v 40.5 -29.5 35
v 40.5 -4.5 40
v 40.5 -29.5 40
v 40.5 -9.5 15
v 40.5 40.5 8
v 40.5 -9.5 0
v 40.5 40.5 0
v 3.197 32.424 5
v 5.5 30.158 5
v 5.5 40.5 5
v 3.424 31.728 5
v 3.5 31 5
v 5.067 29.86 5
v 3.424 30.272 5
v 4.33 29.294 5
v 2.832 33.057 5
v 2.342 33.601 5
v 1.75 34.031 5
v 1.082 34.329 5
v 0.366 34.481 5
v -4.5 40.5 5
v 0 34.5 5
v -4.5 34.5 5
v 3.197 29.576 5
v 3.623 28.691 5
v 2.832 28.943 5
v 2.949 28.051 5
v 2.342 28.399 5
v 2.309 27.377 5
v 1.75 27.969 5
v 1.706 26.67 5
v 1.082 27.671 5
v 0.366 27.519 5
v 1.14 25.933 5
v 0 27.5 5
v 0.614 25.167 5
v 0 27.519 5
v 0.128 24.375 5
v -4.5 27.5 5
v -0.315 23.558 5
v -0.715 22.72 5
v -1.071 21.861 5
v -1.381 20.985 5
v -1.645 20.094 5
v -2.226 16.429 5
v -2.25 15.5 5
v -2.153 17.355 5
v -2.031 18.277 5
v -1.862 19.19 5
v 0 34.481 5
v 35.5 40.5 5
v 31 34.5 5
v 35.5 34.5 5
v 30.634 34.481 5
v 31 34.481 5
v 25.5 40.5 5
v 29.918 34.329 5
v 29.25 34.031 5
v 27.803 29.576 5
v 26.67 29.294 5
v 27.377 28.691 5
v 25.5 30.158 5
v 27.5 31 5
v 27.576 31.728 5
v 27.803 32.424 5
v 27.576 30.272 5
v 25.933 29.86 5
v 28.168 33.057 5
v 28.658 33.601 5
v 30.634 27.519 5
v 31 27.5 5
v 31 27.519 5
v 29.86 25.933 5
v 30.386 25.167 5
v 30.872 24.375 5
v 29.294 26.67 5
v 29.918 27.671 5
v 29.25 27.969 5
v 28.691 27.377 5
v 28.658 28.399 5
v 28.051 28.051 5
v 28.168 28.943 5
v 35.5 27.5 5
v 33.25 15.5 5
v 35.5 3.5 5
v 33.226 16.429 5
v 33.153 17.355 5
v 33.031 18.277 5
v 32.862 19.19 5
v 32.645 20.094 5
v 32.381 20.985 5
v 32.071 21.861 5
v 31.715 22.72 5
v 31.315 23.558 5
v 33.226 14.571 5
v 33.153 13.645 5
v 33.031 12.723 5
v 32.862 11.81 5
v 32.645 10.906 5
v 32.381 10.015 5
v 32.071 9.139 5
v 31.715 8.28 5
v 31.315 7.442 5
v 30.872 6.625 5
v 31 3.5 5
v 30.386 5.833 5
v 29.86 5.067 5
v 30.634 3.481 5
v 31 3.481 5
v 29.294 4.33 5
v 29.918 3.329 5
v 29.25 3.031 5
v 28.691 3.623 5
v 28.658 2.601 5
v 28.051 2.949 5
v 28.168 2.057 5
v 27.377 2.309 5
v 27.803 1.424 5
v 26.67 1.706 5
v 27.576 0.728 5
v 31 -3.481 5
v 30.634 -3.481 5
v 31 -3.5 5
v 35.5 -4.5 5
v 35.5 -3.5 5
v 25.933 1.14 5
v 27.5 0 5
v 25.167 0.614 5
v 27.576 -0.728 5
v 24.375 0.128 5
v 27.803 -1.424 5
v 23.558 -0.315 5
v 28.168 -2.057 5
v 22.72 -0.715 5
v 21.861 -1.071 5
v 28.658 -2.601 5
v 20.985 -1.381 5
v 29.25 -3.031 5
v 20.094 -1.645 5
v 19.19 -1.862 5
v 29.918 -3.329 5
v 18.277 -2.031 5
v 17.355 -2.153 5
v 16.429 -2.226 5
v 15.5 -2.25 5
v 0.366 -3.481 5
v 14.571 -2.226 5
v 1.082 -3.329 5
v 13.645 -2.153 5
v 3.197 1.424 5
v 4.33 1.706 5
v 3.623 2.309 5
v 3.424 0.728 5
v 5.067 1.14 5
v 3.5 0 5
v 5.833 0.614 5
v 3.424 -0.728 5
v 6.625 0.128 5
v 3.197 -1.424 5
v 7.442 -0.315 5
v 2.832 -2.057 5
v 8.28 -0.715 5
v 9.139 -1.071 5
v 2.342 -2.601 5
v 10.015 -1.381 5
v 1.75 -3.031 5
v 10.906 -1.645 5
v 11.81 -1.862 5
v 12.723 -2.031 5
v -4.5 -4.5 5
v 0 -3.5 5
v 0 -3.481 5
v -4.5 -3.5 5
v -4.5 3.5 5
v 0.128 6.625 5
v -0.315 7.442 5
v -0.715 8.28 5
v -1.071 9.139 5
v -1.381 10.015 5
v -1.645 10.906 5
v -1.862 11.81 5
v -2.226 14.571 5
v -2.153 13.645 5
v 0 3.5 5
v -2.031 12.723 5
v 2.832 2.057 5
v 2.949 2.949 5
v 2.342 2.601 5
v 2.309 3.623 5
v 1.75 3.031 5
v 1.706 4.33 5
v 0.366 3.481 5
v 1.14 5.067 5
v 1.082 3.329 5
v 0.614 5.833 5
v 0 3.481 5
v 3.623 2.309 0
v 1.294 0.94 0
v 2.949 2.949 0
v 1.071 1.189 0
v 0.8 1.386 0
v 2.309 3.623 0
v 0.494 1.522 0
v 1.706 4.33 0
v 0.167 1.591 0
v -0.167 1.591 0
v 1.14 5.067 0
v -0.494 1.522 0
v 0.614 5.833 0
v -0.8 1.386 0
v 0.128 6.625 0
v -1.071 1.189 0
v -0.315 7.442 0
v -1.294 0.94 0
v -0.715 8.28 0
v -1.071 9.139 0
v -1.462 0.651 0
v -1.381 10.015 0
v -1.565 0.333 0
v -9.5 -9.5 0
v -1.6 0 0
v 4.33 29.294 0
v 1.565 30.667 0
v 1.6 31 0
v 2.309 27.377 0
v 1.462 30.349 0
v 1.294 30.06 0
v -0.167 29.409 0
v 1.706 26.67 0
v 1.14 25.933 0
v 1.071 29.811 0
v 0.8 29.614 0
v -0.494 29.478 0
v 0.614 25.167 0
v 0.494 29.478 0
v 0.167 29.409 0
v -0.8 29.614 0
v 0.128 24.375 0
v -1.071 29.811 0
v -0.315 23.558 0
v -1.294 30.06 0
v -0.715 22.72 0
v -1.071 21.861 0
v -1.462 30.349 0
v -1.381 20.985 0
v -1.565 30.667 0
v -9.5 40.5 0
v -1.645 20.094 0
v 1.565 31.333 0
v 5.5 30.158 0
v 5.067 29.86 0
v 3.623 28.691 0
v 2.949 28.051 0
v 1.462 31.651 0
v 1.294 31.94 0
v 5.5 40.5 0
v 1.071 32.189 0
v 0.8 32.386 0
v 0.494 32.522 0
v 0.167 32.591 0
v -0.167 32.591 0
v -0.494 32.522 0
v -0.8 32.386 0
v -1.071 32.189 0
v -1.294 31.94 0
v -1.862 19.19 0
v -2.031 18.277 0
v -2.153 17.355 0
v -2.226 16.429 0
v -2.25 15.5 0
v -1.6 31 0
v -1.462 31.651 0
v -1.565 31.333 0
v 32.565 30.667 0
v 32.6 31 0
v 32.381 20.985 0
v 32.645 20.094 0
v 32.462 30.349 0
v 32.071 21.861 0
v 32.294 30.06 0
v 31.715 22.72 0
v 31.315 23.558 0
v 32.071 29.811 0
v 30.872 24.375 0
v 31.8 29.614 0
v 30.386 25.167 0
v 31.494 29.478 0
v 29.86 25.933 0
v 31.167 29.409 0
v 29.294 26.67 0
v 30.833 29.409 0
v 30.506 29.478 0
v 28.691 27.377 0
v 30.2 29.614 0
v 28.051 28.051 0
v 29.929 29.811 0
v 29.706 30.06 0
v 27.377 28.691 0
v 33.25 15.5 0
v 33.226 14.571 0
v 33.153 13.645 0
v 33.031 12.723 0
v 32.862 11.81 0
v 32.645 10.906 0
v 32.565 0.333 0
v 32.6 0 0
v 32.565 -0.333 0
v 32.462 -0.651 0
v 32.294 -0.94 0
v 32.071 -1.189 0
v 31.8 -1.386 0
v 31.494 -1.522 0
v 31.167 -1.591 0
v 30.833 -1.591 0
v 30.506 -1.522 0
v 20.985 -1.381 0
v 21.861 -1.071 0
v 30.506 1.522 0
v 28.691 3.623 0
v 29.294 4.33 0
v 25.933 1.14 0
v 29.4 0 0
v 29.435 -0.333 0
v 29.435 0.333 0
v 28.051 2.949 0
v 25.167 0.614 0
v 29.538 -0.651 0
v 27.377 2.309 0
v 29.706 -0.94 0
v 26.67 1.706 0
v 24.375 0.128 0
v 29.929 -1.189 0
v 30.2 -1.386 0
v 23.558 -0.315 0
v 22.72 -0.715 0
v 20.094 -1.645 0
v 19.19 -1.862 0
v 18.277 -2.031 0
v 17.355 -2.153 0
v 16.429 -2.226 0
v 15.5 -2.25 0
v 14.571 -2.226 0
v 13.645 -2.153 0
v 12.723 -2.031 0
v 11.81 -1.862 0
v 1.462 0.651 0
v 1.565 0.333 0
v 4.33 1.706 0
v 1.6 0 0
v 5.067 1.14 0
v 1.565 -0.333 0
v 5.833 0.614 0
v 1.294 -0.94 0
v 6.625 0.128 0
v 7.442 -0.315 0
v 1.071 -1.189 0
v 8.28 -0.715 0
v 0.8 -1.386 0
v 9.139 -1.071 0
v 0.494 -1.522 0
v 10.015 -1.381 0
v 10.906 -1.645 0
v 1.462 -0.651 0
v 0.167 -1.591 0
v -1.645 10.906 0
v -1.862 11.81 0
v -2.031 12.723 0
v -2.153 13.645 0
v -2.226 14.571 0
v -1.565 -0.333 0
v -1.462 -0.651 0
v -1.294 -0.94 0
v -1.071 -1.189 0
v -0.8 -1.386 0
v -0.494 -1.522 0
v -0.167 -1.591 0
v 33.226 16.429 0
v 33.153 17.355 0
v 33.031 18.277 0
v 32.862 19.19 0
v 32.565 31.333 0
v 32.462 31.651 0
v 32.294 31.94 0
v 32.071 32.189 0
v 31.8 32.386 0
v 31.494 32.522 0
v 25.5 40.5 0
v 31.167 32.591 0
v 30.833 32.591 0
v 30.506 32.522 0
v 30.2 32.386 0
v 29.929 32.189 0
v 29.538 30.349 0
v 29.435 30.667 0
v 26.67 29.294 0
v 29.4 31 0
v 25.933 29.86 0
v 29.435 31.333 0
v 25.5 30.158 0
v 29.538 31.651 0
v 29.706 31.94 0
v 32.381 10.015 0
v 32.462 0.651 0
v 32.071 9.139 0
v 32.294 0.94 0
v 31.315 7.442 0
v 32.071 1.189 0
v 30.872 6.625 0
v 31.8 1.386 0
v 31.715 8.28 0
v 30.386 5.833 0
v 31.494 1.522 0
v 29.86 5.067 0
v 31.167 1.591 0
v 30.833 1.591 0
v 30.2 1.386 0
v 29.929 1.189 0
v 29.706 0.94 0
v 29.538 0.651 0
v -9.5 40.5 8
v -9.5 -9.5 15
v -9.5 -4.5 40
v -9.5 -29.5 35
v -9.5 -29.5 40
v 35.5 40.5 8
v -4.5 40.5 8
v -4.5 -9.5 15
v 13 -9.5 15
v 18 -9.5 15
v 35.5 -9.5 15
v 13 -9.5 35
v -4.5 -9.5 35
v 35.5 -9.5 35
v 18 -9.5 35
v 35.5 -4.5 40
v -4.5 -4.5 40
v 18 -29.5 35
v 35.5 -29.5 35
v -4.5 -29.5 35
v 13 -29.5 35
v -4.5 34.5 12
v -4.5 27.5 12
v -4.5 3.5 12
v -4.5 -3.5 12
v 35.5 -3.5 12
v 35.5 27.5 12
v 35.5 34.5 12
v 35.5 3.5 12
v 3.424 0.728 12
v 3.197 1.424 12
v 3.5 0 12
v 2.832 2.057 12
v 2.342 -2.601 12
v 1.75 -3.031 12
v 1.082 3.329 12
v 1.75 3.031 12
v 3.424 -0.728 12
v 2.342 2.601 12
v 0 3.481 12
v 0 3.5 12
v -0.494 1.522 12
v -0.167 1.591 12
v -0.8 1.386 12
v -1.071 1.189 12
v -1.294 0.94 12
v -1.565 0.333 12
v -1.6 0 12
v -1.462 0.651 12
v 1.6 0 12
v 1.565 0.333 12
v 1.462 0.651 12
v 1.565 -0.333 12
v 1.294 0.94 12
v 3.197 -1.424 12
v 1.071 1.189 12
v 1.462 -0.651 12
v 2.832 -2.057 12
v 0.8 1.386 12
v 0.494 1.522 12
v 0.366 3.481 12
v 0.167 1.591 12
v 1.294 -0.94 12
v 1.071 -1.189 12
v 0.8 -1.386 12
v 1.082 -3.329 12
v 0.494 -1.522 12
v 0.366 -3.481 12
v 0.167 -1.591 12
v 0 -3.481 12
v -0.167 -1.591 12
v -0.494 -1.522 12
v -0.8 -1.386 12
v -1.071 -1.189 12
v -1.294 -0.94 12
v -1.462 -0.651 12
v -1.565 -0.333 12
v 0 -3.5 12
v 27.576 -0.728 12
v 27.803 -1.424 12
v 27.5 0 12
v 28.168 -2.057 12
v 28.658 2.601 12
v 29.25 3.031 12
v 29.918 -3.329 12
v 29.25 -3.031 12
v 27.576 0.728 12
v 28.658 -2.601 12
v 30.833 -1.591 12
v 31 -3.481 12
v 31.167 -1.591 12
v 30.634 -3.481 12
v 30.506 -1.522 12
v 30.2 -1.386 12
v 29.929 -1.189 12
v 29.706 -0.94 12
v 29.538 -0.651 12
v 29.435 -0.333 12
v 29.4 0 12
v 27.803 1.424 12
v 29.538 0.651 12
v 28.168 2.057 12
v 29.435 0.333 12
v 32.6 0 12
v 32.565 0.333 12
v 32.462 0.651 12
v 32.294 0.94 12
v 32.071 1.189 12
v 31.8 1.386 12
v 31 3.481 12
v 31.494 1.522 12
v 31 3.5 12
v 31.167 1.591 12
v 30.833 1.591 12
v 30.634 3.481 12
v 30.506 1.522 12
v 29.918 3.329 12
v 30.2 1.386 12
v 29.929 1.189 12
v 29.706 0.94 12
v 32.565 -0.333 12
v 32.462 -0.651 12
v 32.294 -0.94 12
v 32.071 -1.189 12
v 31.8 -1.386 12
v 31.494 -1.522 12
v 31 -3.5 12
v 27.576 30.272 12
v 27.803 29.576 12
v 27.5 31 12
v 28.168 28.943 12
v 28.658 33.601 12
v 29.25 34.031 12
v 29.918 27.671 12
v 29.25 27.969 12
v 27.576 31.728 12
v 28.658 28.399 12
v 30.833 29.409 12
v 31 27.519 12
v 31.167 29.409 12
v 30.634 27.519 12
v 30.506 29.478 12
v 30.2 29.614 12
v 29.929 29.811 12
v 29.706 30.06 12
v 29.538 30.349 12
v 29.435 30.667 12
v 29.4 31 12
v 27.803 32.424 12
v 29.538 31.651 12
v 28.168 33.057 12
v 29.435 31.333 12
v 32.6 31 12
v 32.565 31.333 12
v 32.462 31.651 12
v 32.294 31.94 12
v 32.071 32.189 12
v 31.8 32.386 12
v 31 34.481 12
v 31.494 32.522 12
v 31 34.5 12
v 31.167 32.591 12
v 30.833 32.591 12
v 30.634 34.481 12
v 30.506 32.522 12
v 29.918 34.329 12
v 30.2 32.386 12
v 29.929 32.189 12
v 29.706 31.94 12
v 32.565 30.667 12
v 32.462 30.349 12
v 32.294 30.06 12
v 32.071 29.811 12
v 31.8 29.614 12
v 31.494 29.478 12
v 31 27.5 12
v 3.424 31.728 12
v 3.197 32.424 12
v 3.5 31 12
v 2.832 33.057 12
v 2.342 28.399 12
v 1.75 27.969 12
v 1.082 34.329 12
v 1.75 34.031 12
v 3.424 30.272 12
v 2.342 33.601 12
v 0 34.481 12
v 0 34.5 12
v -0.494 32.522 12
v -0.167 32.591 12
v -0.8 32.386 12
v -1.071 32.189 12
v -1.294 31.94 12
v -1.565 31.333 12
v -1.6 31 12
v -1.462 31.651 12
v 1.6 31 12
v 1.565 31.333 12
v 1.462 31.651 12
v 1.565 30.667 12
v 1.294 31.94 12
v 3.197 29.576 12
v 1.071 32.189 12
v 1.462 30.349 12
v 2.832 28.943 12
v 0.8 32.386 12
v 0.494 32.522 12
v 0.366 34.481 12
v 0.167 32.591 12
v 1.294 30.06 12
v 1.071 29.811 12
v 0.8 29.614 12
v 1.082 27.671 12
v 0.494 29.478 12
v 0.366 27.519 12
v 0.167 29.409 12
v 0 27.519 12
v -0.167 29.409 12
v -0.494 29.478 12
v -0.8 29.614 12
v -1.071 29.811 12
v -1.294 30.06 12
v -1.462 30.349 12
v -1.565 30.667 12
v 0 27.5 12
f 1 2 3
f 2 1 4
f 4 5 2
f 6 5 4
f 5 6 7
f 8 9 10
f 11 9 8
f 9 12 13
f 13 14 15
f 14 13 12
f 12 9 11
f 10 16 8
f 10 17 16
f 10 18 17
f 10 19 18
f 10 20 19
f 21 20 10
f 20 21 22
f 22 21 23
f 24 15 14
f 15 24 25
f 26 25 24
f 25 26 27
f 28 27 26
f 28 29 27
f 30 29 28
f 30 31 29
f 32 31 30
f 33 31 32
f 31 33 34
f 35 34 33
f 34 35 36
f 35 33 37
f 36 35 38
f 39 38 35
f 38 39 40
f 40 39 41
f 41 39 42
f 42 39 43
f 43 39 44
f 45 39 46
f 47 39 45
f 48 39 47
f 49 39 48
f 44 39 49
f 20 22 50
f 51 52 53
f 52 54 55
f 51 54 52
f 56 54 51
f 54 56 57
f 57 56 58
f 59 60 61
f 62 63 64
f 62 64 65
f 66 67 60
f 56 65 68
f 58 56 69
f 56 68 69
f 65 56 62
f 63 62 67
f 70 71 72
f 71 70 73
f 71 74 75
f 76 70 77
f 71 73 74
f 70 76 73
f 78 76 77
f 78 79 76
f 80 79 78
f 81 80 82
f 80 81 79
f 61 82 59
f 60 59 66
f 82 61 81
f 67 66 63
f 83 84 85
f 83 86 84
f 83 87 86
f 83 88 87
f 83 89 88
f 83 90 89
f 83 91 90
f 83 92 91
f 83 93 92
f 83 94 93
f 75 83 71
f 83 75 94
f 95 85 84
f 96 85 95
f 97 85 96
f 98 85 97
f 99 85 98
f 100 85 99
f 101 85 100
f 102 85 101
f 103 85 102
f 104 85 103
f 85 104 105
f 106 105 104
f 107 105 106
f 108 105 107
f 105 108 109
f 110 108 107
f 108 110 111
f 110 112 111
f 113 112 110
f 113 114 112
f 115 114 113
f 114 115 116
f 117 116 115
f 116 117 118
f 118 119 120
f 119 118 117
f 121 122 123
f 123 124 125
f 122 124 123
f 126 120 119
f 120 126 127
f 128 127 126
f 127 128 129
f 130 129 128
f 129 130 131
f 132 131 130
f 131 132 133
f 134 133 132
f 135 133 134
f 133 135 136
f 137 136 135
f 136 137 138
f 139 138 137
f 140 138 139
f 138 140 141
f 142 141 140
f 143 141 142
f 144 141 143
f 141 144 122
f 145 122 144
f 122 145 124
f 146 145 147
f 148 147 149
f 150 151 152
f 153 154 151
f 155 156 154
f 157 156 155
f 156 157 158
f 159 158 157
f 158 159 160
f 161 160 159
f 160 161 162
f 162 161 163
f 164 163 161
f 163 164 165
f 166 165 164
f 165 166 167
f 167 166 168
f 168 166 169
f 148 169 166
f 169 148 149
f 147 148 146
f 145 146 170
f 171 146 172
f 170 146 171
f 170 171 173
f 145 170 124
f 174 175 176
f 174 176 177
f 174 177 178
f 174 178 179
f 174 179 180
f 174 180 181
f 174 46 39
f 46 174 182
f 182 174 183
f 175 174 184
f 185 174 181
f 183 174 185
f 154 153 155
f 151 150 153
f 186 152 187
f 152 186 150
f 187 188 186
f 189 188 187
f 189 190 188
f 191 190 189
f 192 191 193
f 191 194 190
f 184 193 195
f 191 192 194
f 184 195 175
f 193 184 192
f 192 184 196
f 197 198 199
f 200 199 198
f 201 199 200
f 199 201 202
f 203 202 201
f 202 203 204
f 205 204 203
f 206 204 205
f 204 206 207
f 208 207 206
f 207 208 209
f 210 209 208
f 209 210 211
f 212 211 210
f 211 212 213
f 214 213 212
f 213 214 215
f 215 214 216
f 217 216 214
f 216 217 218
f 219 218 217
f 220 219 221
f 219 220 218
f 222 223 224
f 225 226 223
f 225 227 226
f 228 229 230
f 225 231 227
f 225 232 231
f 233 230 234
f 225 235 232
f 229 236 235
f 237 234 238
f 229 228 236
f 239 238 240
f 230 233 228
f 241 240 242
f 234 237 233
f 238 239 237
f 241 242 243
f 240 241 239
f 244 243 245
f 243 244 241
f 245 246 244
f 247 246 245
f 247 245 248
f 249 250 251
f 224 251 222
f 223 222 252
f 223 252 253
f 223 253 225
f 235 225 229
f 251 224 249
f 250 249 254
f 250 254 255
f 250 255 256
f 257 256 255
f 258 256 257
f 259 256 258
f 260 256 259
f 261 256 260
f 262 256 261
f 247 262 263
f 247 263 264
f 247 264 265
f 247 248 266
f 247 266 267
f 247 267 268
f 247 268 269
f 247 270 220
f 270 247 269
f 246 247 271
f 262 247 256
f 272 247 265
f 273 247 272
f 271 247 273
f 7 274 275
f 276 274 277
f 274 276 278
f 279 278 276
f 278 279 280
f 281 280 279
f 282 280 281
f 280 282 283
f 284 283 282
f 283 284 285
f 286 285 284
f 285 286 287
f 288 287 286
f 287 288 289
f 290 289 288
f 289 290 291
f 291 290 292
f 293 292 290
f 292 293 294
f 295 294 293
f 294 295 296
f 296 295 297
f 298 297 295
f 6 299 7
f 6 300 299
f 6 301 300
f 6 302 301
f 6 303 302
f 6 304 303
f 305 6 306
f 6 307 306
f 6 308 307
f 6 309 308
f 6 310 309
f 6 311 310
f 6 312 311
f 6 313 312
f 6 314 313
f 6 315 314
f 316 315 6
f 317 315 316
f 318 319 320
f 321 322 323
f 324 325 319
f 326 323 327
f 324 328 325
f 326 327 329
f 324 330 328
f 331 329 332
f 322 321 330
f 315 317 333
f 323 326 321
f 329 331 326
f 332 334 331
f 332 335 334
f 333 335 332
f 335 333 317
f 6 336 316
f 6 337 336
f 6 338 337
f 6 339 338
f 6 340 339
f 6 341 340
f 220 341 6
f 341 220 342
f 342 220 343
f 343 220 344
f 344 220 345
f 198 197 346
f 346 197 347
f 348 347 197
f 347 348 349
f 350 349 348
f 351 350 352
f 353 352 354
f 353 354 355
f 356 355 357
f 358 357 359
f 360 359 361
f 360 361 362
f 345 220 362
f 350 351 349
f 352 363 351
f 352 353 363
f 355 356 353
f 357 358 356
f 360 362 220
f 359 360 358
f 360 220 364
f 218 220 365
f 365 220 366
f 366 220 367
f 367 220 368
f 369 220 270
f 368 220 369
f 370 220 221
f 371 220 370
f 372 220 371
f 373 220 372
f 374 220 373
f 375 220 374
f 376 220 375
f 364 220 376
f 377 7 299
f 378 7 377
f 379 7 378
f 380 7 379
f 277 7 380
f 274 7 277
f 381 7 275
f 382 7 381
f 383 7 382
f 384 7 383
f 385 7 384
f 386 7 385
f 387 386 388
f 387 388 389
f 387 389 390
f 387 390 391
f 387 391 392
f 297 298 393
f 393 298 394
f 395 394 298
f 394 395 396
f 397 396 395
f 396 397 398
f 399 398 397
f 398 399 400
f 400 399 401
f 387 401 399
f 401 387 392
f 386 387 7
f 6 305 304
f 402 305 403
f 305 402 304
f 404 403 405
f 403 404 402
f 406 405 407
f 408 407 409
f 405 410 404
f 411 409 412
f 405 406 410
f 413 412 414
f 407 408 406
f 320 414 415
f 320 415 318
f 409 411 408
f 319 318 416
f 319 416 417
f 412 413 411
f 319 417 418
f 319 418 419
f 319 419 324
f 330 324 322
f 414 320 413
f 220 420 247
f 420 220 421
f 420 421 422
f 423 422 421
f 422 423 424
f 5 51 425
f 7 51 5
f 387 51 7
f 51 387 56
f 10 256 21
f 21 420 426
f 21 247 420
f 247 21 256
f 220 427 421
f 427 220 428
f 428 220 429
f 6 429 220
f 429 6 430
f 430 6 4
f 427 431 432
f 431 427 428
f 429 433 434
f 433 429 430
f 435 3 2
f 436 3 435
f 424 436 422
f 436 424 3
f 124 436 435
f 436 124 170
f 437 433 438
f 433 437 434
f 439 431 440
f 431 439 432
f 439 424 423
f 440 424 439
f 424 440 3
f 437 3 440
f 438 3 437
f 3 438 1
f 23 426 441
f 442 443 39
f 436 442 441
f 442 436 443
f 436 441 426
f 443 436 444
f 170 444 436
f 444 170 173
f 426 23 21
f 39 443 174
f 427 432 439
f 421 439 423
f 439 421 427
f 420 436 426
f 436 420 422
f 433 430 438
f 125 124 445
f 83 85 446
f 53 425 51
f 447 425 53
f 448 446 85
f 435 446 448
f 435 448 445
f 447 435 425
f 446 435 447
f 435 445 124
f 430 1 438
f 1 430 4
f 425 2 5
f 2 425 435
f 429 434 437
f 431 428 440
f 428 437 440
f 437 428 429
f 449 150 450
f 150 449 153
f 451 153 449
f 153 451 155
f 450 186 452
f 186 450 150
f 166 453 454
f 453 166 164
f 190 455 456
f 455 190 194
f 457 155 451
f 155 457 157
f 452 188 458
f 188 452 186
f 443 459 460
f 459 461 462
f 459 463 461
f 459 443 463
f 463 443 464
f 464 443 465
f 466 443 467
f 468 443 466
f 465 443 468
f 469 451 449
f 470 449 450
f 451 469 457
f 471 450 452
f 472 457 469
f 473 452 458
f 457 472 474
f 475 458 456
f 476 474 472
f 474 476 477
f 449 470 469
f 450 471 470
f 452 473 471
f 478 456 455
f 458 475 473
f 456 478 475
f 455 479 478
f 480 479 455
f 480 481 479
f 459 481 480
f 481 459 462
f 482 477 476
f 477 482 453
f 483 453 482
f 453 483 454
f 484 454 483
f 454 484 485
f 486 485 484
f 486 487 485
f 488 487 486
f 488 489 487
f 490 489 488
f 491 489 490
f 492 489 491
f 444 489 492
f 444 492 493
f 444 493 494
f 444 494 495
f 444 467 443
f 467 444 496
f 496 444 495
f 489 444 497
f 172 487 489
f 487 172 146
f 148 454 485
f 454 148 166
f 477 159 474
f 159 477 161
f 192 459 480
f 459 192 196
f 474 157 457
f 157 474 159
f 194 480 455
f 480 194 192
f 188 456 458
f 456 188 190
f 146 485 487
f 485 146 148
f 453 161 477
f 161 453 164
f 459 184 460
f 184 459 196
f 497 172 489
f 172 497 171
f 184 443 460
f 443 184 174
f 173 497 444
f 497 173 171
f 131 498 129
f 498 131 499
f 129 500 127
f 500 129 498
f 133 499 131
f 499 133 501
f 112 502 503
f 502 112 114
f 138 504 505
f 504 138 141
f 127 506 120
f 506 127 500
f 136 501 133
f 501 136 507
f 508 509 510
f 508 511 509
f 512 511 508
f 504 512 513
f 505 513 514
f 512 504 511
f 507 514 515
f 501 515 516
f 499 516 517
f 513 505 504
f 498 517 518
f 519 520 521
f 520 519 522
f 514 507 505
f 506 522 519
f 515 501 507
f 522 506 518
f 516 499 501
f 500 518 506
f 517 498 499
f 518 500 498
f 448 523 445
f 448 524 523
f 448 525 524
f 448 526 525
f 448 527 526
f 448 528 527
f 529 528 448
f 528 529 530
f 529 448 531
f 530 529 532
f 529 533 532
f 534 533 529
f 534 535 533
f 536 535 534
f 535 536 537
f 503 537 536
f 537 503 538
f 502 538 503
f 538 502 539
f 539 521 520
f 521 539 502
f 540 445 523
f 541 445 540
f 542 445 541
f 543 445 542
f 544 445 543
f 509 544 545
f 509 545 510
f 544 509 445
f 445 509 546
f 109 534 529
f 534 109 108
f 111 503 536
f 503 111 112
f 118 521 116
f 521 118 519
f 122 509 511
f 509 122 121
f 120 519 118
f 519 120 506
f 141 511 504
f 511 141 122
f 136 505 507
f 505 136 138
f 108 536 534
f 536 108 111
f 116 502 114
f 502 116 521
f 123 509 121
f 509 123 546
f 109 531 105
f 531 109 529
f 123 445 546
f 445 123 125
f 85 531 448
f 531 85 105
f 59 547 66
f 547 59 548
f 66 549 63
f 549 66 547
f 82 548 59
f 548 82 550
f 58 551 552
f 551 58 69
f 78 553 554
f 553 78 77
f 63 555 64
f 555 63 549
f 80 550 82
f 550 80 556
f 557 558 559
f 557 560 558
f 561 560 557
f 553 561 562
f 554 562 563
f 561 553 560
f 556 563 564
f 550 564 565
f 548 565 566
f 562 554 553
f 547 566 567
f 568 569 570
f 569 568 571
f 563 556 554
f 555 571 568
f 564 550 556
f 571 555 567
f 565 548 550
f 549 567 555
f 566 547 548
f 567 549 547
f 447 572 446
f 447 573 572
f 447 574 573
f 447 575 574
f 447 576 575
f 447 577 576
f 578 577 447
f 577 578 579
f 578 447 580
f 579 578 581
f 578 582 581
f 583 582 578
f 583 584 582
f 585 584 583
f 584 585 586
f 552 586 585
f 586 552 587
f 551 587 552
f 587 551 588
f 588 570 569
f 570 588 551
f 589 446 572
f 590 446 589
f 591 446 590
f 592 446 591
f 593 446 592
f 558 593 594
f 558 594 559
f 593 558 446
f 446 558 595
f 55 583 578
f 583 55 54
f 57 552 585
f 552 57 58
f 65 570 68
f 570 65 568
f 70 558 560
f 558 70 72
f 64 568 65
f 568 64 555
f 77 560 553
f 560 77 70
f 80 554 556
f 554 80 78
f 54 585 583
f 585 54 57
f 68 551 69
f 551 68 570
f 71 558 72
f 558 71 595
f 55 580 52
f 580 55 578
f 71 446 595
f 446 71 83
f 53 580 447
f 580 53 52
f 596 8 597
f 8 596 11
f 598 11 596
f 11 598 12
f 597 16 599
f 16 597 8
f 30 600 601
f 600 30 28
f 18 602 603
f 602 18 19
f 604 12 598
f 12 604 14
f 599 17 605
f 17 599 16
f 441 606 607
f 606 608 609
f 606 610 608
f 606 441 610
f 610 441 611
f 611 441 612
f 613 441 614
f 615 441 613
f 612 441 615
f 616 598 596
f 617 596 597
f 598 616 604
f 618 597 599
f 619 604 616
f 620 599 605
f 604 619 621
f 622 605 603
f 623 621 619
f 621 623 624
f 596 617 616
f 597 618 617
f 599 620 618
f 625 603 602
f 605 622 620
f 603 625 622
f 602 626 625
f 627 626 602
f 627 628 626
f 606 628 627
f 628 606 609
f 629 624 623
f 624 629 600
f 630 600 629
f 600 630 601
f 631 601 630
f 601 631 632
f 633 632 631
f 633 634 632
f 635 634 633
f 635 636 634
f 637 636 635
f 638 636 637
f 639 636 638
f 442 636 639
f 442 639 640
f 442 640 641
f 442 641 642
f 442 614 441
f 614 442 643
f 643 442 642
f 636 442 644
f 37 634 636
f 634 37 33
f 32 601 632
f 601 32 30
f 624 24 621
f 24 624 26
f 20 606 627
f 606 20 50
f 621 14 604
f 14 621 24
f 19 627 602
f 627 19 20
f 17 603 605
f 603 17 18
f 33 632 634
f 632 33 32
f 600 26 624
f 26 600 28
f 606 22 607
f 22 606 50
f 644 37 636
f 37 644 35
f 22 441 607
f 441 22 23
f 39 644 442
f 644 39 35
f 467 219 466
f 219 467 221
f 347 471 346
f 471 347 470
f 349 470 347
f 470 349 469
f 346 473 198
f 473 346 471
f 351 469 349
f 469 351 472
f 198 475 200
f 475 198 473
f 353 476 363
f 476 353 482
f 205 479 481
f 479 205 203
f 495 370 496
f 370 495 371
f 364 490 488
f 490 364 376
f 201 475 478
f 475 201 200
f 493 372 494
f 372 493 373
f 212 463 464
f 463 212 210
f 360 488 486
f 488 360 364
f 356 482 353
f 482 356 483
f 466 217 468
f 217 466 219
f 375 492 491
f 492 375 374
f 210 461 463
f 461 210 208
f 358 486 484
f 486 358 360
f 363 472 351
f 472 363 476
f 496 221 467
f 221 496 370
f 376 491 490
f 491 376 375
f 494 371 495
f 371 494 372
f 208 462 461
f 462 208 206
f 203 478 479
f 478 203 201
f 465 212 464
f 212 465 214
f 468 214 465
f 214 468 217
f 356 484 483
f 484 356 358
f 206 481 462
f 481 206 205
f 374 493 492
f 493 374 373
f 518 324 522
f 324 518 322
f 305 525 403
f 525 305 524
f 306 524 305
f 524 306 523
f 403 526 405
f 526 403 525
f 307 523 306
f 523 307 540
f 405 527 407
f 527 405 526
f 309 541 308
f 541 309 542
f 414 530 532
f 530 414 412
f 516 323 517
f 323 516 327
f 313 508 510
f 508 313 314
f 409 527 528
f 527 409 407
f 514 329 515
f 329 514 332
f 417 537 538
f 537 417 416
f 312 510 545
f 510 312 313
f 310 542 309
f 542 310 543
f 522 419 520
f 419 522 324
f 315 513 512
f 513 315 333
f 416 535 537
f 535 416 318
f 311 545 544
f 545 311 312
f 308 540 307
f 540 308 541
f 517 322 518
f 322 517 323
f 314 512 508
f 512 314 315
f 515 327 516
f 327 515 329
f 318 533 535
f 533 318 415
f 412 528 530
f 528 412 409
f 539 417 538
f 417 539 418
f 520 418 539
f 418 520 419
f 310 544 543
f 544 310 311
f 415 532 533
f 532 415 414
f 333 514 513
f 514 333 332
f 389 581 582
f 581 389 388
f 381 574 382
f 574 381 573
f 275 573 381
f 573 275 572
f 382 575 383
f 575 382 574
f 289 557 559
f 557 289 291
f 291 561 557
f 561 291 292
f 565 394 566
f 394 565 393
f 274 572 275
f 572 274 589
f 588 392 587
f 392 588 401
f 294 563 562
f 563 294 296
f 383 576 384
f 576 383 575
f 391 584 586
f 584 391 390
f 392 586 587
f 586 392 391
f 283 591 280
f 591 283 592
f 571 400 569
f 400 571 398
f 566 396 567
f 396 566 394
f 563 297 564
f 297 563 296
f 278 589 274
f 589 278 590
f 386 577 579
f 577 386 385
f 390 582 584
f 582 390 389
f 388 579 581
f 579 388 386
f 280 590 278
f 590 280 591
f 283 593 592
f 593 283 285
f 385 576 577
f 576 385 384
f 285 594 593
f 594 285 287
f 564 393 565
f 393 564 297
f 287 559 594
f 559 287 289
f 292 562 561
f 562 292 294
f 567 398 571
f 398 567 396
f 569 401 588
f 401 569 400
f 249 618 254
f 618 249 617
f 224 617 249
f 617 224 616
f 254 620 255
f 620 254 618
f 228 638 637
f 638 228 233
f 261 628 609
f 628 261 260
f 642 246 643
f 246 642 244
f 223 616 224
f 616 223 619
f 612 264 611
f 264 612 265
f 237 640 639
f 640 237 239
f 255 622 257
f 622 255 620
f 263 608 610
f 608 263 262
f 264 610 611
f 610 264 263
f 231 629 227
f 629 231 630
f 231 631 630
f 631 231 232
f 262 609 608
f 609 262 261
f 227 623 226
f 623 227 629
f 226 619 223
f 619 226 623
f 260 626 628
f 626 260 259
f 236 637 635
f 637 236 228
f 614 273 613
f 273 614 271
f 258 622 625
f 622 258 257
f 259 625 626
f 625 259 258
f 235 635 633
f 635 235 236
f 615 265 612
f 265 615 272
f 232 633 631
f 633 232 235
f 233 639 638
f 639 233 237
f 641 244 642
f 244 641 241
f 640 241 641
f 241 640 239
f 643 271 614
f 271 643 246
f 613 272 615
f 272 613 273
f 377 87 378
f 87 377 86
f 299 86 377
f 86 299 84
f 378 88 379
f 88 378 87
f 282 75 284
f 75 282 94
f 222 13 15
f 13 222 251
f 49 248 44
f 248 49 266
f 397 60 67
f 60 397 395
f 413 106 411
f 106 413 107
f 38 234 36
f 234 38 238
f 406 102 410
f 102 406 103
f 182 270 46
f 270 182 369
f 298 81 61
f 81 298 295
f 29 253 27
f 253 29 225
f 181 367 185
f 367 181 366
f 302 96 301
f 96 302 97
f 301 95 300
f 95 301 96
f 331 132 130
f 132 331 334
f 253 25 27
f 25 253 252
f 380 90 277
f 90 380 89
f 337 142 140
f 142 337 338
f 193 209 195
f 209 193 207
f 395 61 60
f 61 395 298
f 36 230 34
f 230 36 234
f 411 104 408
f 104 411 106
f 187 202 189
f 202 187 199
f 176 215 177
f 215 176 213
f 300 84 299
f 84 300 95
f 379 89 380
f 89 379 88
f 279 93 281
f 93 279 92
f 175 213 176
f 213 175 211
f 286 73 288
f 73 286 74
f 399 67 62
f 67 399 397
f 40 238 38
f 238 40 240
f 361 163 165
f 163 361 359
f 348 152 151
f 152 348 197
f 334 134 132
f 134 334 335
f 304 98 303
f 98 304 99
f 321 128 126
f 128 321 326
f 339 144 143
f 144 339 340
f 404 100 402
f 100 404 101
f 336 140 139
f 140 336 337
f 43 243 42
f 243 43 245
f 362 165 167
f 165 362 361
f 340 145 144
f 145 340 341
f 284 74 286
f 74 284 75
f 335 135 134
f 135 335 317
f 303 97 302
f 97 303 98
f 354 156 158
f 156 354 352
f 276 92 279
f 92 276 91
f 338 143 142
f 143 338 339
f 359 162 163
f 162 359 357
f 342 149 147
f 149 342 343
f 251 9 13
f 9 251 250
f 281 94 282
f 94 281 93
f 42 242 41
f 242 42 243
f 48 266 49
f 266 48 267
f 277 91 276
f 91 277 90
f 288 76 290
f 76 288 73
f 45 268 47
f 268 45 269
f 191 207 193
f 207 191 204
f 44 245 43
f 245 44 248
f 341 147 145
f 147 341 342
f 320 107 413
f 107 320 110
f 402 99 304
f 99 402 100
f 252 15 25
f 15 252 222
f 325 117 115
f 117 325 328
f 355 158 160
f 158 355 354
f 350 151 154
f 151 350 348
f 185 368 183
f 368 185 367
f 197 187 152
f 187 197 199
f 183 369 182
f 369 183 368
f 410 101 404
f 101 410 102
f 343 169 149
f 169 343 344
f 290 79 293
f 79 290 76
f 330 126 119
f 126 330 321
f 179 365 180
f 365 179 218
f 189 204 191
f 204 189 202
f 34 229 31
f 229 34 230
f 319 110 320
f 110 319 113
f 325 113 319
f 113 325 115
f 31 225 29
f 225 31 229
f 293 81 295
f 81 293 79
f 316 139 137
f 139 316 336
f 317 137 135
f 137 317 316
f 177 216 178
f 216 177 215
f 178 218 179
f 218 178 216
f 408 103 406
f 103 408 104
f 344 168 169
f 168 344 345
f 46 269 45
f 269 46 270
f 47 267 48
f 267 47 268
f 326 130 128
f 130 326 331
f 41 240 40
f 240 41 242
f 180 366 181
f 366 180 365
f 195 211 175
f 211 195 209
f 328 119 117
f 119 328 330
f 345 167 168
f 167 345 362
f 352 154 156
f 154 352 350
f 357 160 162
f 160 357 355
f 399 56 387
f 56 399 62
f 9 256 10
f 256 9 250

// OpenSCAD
$fn=30;

myBoltLen=20;
myBackHeight=40;

// translate([-9.5,42.5,-24.75]) import("./Motor_Stop_Bracket_v2_Motor_Stop_Bracket_v2_Body1_.stl");

difference() {
   union() {
      translate([-9.5,-9.5,0]) {
         cube([50,50,5]);
         cube([50,5,myBackHeight]);
         translate([0,-20,myBackHeight-5]) cube([50,20,5]);
         side();
         translate([45,0,0]) side();
         translate([45/2,0,0]) middle();
      }
      translate([0,0,0]) boltHole();
      translate([31,0,0]) rotate([0,0,180]) boltHole();
      translate([31,31,0]) rotate([0,0,180]) boltHole();
      translate([0,31,0]) boltHole();
   }
      cutouts();
}


module side(frontHeight=8,backHeight=myBackHeight) {
   translate([5,50,0]) rotate([90,0,-90])
   linear_extrude(height=5) polygon(points=[[0,0],[0,frontHeight],
                                       [45,backHeight], [70,backHeight],
                                       [70,backHeight-5],[50,backHeight-25],
                                       [50,0]]);
}

module middle(frontHeight=8,backHeight=40) {
   translate([5,50,0]) rotate([90,0,-90])
   linear_extrude(height=5) polygon(points=[[45,0],[45,frontHeight],
                                       [47,backHeight], [70,backHeight],
                                       [70,backHeight-5],[50,backHeight-25],
                                       [50,0]]);
}

module boltHole(boltLen=myBoltLen) {
   translate([0,0,0]) cylinder(d=7,h=boltLen-8);
   translate([-7,-7/2,0]) cube([7,7,boltLen-8]);
}

module cutouts() {
   translate([0,0,-0.5]) cylinder(d=3.2,h=30);
   translate([31,0,-0.5]) cylinder(d=3.2,h=30);
   translate([31,31,-0.50]) cylinder(d=3.2,h=30);
   translate([0,31,-0.50]) cylinder(d=3.2,h=30);

   translate([15.5,15.5,-0.50]) cylinder($fn=120,d=35.5,h=30);
   translate([5.5,25,-0.50]) cube([20,20,30]);
}
